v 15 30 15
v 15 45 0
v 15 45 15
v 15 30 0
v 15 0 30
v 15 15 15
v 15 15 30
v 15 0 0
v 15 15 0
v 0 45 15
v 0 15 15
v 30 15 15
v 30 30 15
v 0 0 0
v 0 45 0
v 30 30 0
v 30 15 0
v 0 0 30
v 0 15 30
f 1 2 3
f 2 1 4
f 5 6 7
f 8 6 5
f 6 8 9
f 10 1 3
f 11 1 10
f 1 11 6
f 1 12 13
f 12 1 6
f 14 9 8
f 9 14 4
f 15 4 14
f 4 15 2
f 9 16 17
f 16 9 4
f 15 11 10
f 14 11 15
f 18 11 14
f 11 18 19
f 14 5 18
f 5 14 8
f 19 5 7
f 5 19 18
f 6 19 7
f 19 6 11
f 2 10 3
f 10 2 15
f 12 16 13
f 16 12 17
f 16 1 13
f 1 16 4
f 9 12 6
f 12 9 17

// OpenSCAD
// Fongo piece 1: Hello. GPL-3.0; see README.txt.
// All cube positions derive from the canonical catalogue. z points up.
unit = 15; // mm, scale all pieces AND cards together
positions = [[0,0,0],[0,0,1],[0,1,0],[0,2,0],[1,1,0]];
union() { for (p = positions) translate(p * unit) cube([unit, unit, unit]); }
